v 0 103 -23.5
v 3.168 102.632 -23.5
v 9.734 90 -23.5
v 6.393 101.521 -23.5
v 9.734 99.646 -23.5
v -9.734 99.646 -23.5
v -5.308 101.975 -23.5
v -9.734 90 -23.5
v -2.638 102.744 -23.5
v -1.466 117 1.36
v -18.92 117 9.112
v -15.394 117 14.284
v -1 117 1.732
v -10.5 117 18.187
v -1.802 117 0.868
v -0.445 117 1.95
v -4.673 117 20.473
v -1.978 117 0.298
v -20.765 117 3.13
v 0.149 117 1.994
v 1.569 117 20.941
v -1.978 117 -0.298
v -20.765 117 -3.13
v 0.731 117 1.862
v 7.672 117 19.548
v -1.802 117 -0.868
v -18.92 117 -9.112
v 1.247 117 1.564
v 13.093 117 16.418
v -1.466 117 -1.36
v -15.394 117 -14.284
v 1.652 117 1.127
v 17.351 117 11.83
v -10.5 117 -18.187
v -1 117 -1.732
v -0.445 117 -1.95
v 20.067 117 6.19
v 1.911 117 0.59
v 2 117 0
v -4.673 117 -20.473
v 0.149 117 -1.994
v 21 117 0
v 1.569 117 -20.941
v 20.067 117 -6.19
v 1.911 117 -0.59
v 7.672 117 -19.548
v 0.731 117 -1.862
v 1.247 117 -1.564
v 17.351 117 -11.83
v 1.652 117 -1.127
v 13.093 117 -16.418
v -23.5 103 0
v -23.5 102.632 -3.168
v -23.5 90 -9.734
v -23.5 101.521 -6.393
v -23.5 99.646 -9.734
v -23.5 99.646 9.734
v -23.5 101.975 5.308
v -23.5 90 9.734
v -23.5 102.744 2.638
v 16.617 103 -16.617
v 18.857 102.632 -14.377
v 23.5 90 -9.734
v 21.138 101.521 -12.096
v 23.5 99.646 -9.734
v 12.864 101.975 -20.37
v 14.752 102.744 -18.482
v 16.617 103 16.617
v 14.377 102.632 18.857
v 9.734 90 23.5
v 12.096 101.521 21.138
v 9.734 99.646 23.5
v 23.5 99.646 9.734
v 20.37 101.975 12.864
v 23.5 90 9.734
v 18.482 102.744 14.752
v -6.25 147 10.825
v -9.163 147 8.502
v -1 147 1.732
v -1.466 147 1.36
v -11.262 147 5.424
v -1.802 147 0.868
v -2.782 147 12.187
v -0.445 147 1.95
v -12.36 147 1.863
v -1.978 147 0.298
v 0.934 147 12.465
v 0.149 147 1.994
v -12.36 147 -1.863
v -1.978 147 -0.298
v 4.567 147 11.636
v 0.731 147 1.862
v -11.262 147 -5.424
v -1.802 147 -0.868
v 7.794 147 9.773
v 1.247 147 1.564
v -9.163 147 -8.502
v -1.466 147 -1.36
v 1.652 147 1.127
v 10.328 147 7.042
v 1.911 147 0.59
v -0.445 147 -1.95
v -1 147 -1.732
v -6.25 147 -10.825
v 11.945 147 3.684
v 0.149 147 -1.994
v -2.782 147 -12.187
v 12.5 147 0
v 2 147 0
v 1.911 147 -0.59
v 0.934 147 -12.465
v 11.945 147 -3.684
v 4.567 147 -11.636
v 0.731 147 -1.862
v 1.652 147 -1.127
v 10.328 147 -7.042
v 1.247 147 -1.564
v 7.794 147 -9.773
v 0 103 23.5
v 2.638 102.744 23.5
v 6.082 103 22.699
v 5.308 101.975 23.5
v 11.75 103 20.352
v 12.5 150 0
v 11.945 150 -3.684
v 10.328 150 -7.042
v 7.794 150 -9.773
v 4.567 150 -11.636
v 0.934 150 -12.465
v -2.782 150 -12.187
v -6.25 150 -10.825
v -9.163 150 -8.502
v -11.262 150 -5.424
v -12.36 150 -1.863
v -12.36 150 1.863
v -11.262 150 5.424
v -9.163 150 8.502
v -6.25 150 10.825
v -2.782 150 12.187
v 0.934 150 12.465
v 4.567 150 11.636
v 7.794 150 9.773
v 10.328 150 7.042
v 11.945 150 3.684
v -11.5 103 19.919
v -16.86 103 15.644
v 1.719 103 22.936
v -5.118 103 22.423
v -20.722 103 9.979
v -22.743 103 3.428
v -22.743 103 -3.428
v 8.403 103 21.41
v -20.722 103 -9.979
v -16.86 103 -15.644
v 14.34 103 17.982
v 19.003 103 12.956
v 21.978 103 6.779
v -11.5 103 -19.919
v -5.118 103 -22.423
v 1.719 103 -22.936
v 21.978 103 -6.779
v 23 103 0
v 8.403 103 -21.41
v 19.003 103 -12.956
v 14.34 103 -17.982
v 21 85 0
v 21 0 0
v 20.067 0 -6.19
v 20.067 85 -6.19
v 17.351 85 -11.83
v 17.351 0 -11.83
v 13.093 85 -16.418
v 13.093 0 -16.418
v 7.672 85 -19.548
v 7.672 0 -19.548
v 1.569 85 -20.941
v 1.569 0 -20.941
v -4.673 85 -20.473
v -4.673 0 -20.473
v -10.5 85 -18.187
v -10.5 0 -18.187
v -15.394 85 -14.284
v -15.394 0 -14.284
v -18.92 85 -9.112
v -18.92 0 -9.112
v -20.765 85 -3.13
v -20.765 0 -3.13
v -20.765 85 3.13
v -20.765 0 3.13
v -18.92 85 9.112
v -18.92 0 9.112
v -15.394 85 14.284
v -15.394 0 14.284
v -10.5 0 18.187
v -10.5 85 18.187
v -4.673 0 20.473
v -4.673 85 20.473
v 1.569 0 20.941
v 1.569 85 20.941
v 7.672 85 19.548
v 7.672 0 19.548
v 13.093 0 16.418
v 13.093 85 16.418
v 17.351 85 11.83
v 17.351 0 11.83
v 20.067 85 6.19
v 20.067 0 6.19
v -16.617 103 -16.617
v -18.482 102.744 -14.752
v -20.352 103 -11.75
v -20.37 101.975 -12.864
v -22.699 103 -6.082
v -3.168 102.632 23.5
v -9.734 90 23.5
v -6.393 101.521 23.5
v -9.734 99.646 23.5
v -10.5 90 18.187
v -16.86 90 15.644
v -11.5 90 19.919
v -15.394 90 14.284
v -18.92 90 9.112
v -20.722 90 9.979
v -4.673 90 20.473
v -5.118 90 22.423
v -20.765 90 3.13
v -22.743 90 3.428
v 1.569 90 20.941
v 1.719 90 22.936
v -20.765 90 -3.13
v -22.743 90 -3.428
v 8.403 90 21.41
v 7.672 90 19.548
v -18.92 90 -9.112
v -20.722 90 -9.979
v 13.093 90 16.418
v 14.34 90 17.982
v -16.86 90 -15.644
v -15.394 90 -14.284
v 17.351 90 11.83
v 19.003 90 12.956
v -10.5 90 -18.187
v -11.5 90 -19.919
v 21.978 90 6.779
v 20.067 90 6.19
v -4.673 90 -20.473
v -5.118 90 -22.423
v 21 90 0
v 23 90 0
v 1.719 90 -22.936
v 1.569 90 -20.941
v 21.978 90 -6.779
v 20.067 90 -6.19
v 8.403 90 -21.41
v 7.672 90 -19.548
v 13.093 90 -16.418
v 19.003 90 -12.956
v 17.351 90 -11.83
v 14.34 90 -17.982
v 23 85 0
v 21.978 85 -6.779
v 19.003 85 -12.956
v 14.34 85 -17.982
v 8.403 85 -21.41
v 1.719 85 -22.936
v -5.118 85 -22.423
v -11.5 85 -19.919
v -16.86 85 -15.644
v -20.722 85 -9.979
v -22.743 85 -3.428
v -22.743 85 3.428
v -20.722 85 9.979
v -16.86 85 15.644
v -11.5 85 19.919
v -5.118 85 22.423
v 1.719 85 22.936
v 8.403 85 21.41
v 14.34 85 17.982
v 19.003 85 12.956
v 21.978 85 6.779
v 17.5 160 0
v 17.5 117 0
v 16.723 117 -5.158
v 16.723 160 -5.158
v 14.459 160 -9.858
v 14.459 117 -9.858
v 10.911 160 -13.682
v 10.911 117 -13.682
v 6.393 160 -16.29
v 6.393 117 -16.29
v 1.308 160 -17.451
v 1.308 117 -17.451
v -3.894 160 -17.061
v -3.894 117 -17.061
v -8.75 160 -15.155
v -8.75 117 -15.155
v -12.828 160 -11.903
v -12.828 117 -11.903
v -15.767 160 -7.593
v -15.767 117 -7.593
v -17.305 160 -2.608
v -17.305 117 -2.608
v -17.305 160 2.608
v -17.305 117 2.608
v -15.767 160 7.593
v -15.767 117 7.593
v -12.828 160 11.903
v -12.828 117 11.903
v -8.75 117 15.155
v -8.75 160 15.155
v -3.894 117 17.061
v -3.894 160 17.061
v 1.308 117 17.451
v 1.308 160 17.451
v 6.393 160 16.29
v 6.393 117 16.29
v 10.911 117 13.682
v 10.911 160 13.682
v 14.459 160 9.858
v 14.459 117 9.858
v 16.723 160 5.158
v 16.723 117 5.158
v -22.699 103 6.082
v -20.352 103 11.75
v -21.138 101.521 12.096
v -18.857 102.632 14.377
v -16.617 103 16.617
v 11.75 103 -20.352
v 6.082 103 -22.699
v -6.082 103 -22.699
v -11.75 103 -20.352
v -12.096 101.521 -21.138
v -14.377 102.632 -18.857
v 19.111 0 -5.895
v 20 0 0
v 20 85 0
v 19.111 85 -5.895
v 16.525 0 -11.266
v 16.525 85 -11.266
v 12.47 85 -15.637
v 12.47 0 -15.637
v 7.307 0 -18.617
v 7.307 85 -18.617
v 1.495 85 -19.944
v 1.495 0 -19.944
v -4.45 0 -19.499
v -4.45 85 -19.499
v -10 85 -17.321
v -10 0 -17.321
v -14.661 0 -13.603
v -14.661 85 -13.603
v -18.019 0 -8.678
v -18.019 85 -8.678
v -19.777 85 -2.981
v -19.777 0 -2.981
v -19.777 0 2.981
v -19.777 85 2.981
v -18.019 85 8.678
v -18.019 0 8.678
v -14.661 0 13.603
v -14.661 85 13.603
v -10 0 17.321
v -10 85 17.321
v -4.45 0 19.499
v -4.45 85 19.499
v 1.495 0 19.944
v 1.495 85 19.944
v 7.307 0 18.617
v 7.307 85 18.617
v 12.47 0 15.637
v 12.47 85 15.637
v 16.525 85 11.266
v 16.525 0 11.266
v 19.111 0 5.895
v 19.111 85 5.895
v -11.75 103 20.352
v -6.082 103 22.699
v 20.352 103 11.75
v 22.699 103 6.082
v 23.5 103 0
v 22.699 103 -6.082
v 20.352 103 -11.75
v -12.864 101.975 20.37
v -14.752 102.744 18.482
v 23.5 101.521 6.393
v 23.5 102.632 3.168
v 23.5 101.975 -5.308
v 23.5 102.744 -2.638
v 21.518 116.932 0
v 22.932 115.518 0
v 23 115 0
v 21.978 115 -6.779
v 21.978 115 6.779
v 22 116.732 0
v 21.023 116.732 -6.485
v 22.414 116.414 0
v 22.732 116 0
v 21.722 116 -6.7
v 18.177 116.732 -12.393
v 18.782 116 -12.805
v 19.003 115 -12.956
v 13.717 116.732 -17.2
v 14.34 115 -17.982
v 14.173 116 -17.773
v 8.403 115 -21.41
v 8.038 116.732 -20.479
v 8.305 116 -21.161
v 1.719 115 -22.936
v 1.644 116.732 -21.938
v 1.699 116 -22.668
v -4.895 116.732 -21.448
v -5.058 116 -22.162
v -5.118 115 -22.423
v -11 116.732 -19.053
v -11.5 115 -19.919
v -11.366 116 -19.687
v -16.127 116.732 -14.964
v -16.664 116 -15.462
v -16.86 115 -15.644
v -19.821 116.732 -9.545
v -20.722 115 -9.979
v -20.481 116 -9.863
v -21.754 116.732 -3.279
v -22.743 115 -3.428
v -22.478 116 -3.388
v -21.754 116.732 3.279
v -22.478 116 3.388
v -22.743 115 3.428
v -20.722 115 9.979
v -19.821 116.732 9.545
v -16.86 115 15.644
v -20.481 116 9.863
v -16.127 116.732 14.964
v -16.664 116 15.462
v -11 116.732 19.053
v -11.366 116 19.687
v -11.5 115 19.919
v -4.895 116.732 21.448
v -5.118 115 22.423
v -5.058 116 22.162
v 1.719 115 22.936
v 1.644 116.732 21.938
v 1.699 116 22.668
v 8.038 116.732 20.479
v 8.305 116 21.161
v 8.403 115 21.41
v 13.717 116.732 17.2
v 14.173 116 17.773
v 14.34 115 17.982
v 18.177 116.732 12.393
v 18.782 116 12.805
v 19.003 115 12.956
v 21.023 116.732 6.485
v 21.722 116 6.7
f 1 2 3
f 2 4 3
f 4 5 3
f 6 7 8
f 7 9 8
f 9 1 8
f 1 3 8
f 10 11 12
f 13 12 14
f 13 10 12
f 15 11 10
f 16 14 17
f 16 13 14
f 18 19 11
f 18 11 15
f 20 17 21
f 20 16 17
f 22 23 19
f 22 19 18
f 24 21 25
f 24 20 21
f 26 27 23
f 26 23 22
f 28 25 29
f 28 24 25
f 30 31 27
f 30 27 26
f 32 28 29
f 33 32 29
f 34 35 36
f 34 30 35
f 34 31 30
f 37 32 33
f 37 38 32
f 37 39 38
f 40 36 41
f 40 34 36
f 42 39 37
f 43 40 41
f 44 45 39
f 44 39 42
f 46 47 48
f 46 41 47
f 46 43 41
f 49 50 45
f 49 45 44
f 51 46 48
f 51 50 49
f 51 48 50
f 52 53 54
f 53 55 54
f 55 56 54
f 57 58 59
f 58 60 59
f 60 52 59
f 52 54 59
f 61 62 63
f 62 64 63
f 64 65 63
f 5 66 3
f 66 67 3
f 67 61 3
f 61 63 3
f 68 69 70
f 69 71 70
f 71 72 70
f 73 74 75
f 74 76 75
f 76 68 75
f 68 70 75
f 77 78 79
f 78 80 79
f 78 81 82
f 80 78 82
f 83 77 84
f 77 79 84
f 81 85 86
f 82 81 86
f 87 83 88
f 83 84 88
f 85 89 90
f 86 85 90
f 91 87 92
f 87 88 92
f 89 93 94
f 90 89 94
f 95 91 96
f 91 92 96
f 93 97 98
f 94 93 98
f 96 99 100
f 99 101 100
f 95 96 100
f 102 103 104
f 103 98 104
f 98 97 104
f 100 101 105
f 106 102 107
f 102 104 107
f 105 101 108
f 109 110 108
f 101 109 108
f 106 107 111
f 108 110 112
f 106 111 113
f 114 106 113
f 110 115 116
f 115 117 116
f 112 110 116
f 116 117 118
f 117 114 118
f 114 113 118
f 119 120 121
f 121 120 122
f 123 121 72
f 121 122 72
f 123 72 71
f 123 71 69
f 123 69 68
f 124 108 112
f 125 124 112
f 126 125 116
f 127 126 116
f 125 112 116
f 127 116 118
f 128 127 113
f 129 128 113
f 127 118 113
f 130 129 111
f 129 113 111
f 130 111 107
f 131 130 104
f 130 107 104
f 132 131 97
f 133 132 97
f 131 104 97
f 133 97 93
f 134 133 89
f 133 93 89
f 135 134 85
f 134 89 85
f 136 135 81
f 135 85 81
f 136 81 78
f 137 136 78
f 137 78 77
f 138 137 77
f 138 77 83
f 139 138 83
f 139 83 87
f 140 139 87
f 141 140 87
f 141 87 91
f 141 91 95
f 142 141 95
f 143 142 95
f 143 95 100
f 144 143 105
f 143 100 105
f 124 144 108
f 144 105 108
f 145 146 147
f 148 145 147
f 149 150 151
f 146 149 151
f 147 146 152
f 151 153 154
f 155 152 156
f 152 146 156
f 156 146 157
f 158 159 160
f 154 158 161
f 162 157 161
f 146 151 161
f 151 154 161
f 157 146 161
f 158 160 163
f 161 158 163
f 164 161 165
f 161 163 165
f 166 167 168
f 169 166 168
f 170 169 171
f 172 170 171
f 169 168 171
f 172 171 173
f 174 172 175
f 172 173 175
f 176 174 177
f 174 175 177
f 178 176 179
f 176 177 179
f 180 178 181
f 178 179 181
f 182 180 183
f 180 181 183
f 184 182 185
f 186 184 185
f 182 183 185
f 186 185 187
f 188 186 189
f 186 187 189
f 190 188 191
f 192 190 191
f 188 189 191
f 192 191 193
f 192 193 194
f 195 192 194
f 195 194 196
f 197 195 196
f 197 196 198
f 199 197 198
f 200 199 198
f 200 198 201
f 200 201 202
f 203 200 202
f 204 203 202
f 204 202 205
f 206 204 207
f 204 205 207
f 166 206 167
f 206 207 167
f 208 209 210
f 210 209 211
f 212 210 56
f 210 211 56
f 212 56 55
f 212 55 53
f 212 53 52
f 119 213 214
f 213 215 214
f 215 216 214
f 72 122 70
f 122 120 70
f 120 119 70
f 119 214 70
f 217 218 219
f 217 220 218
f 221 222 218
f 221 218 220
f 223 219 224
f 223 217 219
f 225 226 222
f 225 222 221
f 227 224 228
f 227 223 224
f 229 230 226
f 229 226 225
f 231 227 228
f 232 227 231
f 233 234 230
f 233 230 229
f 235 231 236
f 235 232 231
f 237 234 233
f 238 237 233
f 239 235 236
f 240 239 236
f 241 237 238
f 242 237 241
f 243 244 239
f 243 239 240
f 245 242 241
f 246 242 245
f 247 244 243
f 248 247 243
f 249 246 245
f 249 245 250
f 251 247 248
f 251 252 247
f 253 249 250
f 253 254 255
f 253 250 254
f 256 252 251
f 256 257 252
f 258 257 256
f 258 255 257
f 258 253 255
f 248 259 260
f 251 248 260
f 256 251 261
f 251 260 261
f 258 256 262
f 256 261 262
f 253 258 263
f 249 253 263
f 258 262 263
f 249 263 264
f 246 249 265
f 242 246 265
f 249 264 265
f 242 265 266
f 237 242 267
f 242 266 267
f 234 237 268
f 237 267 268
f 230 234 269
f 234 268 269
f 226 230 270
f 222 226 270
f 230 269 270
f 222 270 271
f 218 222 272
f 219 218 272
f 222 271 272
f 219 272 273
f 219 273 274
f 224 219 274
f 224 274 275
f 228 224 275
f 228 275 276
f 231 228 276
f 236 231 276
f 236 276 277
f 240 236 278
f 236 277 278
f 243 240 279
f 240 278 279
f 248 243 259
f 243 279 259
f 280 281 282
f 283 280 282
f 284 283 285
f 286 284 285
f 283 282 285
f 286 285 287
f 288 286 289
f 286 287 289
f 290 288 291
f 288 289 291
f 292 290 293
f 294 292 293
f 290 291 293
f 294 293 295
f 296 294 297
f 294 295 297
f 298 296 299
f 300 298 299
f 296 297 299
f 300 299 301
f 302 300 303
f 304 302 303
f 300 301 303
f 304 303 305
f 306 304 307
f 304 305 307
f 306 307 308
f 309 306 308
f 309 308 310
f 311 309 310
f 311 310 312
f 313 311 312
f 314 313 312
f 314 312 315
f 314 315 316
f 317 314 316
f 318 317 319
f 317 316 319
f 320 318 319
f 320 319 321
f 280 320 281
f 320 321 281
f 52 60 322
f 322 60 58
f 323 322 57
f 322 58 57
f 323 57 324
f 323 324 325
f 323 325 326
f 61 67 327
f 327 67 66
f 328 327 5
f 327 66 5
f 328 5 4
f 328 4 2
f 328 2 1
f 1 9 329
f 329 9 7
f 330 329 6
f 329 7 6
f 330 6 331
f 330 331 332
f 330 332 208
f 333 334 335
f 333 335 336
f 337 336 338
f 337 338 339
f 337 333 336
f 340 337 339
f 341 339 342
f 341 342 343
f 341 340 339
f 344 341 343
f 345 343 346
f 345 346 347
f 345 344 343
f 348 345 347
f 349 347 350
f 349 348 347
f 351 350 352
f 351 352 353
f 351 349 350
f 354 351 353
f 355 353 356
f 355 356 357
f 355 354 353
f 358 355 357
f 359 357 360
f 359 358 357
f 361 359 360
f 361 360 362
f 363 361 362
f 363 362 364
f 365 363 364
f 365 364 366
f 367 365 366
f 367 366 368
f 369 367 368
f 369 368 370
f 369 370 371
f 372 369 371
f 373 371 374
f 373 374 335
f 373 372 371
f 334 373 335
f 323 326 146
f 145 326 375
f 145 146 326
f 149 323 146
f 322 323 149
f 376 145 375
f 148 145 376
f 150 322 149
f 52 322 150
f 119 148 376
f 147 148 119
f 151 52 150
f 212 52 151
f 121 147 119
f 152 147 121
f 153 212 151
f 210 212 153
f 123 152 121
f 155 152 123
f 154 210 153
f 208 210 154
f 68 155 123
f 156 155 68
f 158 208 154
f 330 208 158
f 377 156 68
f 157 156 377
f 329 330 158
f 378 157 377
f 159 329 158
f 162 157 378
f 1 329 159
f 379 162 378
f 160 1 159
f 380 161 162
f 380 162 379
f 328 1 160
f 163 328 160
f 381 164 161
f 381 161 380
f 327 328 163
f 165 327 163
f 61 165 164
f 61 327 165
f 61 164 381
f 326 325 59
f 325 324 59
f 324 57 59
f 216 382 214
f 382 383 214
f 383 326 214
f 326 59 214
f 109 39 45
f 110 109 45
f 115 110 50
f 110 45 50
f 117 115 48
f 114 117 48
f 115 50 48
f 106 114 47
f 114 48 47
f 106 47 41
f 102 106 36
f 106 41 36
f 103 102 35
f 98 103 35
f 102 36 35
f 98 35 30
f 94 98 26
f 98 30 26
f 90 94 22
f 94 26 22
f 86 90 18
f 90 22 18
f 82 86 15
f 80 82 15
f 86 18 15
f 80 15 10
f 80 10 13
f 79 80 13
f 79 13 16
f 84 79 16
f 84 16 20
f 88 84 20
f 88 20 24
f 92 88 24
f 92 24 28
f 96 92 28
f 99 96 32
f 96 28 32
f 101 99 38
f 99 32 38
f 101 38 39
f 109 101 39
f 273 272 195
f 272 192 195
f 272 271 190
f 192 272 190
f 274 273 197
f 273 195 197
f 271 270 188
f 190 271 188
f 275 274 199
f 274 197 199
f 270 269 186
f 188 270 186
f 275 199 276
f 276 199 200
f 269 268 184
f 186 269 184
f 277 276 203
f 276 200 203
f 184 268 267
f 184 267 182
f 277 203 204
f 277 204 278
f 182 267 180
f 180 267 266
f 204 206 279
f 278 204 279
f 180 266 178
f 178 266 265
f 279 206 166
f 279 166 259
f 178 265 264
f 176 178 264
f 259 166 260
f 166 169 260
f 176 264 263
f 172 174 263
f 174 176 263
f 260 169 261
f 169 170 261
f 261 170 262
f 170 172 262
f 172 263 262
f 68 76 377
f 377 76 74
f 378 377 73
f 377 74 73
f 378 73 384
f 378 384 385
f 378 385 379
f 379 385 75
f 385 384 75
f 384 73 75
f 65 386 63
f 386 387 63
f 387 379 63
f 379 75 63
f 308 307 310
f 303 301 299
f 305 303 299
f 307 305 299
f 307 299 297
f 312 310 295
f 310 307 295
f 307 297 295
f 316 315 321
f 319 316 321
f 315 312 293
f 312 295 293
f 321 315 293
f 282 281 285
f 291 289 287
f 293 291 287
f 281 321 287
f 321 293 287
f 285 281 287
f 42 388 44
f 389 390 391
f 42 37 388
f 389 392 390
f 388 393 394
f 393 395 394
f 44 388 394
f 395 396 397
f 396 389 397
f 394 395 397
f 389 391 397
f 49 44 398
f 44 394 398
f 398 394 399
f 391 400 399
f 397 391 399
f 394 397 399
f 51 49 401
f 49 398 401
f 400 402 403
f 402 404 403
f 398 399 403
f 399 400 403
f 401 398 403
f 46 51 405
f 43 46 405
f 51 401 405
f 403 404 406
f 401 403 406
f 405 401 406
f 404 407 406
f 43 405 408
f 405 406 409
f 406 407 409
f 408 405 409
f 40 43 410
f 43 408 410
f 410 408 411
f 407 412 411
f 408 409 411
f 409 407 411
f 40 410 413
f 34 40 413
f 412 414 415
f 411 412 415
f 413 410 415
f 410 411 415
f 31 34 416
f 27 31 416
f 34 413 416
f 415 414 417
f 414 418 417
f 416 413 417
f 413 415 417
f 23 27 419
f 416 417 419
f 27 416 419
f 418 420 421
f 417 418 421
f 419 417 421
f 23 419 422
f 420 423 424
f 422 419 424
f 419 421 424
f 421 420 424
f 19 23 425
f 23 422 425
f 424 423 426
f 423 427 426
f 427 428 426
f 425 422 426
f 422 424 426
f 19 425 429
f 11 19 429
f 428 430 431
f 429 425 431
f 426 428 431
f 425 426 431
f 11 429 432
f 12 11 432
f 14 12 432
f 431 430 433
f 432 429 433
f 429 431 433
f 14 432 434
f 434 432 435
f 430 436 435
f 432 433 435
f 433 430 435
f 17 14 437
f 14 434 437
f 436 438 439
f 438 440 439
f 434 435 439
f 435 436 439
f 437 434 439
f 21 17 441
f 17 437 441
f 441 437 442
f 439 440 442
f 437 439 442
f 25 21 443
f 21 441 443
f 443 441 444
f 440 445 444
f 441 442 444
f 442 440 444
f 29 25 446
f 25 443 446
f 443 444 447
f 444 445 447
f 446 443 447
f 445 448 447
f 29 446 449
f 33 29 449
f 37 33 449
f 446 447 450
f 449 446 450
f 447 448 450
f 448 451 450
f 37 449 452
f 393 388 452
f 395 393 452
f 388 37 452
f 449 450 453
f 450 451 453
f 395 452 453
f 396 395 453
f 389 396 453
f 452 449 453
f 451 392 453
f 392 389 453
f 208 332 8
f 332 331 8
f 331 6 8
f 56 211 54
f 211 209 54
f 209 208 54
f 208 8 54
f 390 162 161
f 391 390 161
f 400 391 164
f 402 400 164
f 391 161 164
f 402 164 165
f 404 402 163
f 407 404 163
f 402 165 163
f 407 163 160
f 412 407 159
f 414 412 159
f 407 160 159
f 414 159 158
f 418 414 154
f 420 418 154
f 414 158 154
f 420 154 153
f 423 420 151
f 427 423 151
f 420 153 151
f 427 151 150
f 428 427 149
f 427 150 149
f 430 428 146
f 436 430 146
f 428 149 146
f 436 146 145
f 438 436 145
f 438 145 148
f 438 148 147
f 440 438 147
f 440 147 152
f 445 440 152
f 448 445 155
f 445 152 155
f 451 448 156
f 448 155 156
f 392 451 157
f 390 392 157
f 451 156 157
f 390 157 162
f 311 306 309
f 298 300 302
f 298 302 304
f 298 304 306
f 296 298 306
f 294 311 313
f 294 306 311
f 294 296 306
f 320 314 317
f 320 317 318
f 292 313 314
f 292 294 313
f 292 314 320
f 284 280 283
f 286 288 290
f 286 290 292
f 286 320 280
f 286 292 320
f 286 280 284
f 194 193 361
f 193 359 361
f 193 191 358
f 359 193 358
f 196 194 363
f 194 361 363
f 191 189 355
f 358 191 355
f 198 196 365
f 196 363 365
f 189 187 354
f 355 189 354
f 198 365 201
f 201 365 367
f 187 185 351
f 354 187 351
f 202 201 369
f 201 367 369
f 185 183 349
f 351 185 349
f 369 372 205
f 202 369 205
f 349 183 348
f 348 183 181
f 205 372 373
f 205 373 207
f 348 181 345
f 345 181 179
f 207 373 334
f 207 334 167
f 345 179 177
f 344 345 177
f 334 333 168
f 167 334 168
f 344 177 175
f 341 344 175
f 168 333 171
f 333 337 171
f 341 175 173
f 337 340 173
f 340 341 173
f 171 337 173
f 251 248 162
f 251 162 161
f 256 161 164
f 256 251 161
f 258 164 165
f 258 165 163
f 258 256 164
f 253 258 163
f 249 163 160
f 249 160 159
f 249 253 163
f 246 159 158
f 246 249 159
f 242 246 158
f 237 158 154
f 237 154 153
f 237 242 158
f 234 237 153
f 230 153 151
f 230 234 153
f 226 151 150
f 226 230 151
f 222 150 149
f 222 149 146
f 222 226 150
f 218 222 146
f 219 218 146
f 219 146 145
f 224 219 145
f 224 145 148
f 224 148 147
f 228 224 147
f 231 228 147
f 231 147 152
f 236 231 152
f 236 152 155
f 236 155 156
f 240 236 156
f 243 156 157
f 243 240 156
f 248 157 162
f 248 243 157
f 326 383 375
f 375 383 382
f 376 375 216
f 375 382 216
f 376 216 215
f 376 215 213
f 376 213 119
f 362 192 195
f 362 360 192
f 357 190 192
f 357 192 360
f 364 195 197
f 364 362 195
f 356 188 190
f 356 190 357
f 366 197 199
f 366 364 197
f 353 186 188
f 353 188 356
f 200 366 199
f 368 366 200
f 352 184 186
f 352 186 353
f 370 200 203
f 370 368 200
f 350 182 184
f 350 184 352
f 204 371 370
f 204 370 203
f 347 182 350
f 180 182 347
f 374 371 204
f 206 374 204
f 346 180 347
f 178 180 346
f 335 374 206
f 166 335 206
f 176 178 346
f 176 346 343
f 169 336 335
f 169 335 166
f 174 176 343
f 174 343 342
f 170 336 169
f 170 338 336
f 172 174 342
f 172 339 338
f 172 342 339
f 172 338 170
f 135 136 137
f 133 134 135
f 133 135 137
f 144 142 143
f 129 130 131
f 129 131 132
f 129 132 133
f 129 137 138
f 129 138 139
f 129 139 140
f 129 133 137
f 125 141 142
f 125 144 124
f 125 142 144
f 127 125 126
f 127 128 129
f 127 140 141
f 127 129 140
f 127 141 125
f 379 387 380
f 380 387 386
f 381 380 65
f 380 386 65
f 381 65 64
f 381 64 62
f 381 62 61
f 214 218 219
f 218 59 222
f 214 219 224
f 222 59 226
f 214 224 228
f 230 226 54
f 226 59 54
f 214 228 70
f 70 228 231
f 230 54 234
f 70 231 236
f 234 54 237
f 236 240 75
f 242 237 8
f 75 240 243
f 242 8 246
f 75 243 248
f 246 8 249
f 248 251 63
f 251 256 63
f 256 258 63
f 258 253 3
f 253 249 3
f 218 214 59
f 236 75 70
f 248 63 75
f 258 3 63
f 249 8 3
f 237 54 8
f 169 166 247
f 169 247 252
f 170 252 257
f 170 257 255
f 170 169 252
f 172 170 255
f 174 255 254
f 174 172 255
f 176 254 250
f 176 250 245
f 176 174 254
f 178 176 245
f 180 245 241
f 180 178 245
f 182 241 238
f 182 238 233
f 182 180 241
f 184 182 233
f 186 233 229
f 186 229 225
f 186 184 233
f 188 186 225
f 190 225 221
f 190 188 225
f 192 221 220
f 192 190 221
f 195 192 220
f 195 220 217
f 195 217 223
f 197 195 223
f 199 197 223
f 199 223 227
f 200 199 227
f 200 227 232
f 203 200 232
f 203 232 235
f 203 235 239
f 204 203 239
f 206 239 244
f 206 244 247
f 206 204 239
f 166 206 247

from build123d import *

# Parameters (mm, degrees)
SKETCH1_R           = 21
SKETCH1_R_2         = 20
EXTRUDE_THIN1_DEPTH = 85
SKETCH2_R           = 23
SKETCH2_R_2         = 21
EXTRUDE_THIN2_DEPTH = 5
SKETCH3_R           = 23
EXTRUDE1_DEPTH      = 13
SKETCH7_R           = 23
EXTRUDE3_DEPTH      = 14
SKETCH11_R          = 2
EXTRUDE5_DEPTH      = 30
SKETCH12_R          = 12.5
EXTRUDE6_DEPTH      = 3
SKETCH9_R           = 17.5
EXTRUDE4_DEPTH      = 43
FILLET1_R           = 2


with BuildPart() as part:
    # Sketch1 → Extrude-Thin1 (new body)
    with BuildSketch(Plane(origin=(0, 0, 0), x_dir=(1, 0, 0), z_dir=(0, 1, 0))):
        Circle(SKETCH1_R)
        Circle(SKETCH1_R_2, mode=Mode.SUBTRACT)
    extrude(amount=EXTRUDE_THIN1_DEPTH)


with BuildPart() as body_2:
    # Sketch2 → Extrude-Thin2 (new body)
    with BuildSketch(Plane(origin=(0, 85, 0), x_dir=(1, 0, 0), z_dir=(0, 1, 0))):
        Circle(SKETCH2_R)
        Circle(SKETCH2_R_2, mode=Mode.SUBTRACT)
    extrude(amount=EXTRUDE_THIN2_DEPTH)


with BuildPart() as body_3:
    # Sketch3 → Extrude1 (new body)
    with BuildSketch(Plane(origin=(0, 90, 0), x_dir=(1, 0, 0), z_dir=(0, 1, 0))):
        Polygon((-23.5, -9.734018716), (-9.734018716, -23.5), (9.734018716, -23.5), (23.5, -9.734018716), (23.5, 9.734018716), (9.734018716, 23.5), (-9.734018716, 23.5), (-23.5, 9.734018716), align=None)
        Circle(SKETCH3_R, mode=Mode.SUBTRACT)
    extrude(amount=EXTRUDE1_DEPTH)

    # Cut-Sweep2: sweep along a path in Sketch6
    with BuildLine(Plane(origin=(0, 103, 0), x_dir=(1, 0, 0), z_dir=(0, 1, 0))) as cut_sweep2_path:
        CenterArc((0, 0), 30, 0, 360)
    # Sketch5 → Cut-Sweep2 (sweep, cut)
    with BuildSketch(Plane.XY):
        Polygon((26.386751346, 103), (26.386751346, 98), (23.5, 103), align=None)
    sweep(path=cut_sweep2_path.line, mode=Mode.SUBTRACT)


with BuildPart() as body_4:
    # Sketch7 → Extrude3 (new body)
    with BuildSketch(Plane(origin=(0, 103, 0), x_dir=(1, 0, 0), z_dir=(0, 1, 0))):
        Circle(SKETCH7_R)
    extrude(amount=EXTRUDE3_DEPTH)

    # Sketch11 → Extrude5 (add)
    with BuildSketch(Plane(origin=(0, 117, 0), x_dir=(1, 0, 0), z_dir=(0, 1, 0))):
        Circle(SKETCH11_R)
    extrude(amount=EXTRUDE5_DEPTH)

    # Sketch12 → Extrude6 (add)
    with BuildSketch(Plane(origin=(0, 147, 0), x_dir=(1, 0, 0), z_dir=(0, 1, 0))):
        Circle(SKETCH12_R)
    extrude(amount=EXTRUDE6_DEPTH)

    # Fillet1
    fillet1_edges = [body_4.edges().sort_by_distance(p)[0] for p in [
        (-23, 117, 0),
    ]]
    fillet(fillet1_edges, radius=FILLET1_R)


with BuildPart() as body_5:
    # Sketch9 → Extrude4 (new body)
    with BuildSketch(Plane(origin=(0, 117, 0), x_dir=(1, 0, 0), z_dir=(0, 1, 0))):
        Circle(SKETCH9_R)
    extrude(amount=EXTRUDE4_DEPTH)


solid = Compound([part.part, body_2.part, body_3.part, body_4.part, body_5.part])
